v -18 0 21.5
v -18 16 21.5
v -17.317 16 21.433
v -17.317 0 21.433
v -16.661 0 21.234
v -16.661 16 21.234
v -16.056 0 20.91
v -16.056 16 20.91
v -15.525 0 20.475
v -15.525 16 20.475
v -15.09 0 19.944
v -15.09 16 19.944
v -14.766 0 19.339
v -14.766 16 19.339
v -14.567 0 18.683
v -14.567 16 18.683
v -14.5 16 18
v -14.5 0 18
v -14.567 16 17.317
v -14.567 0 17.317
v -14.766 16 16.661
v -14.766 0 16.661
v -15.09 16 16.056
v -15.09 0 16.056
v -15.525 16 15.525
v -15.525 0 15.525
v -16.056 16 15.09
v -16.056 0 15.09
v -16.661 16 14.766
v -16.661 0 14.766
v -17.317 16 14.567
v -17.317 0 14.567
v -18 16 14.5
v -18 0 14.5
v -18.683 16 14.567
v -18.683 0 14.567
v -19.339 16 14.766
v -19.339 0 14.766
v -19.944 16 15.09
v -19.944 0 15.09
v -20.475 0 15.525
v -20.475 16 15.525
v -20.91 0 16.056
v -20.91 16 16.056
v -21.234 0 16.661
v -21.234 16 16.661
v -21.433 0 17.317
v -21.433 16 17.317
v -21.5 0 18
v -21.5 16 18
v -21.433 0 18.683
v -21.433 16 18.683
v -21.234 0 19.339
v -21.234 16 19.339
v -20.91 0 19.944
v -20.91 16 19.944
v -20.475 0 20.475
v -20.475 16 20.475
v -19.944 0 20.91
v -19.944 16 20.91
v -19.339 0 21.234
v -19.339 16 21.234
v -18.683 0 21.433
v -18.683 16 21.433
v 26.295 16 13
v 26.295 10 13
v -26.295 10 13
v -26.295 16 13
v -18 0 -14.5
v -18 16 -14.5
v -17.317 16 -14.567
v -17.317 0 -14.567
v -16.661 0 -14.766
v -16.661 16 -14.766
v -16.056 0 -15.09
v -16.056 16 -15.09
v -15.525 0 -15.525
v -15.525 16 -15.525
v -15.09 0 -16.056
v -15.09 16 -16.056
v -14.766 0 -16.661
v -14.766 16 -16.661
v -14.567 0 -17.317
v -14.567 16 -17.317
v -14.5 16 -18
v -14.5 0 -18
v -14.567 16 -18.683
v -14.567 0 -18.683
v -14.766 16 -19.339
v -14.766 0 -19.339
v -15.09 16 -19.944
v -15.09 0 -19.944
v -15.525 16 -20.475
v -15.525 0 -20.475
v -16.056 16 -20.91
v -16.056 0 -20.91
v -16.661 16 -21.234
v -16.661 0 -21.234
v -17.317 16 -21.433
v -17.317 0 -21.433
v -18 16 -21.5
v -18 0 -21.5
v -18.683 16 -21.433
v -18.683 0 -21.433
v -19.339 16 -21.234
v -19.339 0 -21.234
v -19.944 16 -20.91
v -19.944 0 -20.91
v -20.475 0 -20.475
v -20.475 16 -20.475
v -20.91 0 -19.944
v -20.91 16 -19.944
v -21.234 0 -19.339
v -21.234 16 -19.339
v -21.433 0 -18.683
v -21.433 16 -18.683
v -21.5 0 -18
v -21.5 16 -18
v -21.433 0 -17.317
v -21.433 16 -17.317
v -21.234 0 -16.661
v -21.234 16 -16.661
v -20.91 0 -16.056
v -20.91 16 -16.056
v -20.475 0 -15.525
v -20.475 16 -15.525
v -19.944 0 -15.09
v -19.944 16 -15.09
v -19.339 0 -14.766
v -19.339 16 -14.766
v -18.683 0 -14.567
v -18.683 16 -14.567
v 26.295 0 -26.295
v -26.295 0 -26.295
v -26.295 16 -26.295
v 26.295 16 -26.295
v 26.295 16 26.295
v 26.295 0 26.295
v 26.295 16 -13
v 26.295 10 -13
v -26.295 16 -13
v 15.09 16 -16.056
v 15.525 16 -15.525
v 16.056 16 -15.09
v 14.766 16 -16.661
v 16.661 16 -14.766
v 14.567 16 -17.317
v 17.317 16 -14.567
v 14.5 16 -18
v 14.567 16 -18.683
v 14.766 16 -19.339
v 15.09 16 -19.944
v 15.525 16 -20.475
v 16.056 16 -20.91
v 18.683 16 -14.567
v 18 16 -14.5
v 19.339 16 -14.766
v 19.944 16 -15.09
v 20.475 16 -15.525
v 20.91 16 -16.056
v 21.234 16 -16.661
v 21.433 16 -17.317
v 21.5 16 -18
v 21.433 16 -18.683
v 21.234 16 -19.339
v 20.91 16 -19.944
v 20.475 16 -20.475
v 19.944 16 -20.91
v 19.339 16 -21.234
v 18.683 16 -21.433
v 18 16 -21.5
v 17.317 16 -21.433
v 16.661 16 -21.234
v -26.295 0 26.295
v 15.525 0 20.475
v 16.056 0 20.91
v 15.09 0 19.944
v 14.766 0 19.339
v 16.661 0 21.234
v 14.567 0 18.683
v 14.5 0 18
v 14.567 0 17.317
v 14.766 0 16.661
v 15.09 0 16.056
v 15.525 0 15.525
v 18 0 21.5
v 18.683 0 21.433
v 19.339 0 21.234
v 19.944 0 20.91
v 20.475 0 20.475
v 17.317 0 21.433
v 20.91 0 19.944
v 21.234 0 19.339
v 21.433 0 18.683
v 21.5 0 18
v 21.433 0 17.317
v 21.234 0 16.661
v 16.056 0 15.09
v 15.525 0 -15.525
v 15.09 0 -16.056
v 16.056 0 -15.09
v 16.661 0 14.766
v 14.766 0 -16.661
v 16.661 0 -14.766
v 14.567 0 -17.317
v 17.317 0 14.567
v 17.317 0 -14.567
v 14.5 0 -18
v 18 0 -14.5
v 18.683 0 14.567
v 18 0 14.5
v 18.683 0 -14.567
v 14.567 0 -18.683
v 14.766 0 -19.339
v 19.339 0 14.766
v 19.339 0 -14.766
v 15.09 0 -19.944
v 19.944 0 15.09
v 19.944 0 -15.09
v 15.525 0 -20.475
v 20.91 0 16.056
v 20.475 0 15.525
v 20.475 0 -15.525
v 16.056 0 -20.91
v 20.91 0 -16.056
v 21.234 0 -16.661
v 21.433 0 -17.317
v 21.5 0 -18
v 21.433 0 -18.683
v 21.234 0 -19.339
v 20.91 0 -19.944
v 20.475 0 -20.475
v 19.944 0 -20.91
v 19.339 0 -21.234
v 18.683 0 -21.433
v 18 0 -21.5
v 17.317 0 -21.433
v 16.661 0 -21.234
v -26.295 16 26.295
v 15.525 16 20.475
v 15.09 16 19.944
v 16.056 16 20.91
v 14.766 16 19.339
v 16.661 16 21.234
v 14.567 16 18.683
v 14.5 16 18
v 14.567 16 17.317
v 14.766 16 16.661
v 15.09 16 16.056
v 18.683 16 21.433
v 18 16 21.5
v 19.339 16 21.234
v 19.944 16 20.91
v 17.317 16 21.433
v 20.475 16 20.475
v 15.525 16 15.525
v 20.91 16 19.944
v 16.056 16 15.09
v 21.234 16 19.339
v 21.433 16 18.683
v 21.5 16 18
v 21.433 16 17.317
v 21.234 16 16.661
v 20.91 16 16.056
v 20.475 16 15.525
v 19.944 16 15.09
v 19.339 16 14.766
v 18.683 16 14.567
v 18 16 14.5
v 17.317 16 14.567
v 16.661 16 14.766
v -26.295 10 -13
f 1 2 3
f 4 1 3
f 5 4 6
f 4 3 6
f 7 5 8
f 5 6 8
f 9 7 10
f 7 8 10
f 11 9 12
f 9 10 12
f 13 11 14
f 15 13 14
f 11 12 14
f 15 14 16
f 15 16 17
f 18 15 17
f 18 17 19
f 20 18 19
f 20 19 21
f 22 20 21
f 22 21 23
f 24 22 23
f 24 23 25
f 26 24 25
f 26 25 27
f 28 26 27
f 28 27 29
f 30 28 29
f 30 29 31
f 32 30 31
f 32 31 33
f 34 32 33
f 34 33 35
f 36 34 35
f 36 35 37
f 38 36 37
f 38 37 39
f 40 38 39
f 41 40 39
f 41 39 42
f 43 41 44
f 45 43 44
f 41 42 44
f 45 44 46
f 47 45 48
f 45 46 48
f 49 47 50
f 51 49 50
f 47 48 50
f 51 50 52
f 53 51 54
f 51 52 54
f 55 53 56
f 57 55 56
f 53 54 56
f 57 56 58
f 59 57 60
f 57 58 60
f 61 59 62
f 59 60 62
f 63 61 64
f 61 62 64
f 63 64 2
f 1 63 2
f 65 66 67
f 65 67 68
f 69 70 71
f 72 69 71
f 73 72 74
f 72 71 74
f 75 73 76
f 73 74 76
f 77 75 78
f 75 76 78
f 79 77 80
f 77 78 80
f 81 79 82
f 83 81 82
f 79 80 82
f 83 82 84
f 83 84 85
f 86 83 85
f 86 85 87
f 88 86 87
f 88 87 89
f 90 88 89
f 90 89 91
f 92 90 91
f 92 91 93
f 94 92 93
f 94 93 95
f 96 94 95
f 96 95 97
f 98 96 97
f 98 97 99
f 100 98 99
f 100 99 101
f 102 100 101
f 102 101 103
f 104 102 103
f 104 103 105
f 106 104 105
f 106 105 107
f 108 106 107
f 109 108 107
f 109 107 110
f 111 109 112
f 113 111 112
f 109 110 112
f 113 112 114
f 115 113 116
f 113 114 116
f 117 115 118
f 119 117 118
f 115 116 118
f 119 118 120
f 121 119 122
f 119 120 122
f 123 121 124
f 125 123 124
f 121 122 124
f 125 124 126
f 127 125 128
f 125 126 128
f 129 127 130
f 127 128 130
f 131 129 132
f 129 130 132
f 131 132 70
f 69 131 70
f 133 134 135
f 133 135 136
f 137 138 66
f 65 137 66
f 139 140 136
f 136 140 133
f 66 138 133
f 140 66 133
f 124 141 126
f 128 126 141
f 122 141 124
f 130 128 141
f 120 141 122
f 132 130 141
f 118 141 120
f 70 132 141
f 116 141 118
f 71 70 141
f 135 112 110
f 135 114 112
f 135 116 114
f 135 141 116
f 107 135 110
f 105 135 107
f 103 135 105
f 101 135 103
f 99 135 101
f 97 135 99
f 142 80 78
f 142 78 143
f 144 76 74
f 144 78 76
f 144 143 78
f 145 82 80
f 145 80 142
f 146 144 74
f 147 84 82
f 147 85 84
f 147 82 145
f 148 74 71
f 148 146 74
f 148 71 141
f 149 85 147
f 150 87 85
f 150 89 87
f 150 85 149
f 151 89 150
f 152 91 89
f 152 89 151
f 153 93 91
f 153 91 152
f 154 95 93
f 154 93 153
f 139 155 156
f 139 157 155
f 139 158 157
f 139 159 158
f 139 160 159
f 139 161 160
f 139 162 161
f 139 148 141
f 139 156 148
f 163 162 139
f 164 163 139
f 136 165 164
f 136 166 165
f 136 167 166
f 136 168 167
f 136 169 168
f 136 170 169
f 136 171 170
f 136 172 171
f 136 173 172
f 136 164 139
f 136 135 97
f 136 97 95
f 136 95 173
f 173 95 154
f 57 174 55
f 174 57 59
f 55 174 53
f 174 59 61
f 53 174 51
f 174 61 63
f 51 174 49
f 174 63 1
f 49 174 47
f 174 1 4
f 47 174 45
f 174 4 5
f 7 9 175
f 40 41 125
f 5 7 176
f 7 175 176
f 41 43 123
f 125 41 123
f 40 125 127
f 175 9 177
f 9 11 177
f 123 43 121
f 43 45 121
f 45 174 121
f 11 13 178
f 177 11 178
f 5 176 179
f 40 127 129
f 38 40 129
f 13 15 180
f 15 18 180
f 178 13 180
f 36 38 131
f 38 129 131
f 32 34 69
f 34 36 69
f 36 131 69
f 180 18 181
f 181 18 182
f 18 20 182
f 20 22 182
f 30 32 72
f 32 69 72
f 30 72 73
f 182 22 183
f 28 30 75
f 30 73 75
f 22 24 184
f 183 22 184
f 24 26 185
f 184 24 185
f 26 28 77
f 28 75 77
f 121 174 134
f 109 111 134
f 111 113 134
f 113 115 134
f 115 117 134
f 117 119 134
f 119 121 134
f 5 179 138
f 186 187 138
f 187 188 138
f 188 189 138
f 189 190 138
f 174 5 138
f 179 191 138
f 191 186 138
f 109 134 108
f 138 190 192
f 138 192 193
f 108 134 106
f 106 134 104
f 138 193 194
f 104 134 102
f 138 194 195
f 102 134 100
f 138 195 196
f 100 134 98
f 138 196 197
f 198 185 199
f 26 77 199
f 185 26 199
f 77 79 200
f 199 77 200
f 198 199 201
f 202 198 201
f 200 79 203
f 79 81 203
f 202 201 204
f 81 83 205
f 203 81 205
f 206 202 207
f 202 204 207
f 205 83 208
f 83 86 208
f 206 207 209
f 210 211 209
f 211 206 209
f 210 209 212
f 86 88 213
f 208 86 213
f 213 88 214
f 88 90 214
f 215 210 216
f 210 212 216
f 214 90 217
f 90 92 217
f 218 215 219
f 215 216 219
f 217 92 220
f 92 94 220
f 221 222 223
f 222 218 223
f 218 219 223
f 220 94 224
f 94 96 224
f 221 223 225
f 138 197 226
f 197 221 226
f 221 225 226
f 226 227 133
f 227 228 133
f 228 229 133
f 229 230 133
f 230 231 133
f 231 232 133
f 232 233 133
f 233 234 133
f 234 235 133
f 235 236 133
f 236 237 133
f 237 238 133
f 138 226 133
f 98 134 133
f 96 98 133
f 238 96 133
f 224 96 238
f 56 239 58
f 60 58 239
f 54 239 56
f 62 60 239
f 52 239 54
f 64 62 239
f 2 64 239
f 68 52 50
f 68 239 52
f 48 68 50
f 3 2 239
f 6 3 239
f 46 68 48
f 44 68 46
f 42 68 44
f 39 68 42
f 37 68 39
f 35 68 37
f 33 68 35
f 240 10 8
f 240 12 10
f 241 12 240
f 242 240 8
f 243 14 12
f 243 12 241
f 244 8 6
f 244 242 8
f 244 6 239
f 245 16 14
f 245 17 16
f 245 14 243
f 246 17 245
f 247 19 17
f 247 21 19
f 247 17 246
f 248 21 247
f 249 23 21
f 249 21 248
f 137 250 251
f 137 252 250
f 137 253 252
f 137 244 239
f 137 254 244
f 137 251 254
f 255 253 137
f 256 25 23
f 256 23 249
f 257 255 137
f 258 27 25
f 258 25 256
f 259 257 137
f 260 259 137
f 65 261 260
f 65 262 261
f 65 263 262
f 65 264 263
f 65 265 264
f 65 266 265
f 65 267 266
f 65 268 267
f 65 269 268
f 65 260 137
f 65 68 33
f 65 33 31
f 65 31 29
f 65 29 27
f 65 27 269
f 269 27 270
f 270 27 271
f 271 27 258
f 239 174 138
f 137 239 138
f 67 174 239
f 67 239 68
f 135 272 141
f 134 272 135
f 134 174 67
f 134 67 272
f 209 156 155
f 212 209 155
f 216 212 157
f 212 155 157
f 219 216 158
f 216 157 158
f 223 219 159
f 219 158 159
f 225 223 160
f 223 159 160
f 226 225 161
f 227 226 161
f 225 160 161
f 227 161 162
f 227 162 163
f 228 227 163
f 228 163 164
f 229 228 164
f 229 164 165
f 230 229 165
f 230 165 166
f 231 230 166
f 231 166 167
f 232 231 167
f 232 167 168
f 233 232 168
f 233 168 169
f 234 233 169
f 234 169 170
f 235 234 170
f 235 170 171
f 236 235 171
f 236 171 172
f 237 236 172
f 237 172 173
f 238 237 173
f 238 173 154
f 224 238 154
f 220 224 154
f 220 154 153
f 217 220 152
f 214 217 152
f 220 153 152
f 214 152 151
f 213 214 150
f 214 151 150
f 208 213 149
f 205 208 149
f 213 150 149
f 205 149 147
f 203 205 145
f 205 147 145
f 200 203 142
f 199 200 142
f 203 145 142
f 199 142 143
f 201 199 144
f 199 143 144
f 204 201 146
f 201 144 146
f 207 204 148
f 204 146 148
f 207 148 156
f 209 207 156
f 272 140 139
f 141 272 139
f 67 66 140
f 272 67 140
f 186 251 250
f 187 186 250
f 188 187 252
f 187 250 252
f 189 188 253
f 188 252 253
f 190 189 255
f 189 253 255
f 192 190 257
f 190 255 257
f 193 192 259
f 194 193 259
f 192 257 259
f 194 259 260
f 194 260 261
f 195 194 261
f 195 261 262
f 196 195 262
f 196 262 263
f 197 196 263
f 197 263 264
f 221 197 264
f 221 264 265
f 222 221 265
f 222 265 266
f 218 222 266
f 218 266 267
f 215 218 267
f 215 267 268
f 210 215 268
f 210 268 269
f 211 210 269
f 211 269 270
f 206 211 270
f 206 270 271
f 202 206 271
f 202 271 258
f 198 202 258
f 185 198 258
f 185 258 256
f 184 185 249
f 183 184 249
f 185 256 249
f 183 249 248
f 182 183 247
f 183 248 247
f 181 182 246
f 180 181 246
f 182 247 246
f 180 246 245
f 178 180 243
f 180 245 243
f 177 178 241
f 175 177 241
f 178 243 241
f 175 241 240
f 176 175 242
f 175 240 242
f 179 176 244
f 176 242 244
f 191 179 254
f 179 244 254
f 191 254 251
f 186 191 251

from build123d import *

# Parameters (mm, degrees)
SKETCH1_W           = 52.59
SKETCH1_H           = 52.59
BOSS_EXTRUDE1_DEPTH = 16
SKETCH2_W           = 26
SKETCH2_H           = 6
CUT_EXTRUDE1_DEPTH  = 61.935499711
SKETCH3_R           = 3.5
CUT_EXTRUDE2_DEPTH  = 41.482762381


with BuildPart() as part:
    # Sketch1 → Boss-Extrude1 (new body)
    with BuildSketch(Plane(origin=(0, 0, 0), x_dir=(1, 0, 0), z_dir=(0, 1, 0))):
        Rectangle(SKETCH1_W, SKETCH1_H)
    extrude(amount=BOSS_EXTRUDE1_DEPTH)

    # Sketch2 → Cut-Extrude1 (cut, through all)
    with BuildSketch(Plane(origin=(26.295, 0, 0), x_dir=(0, 0, -1), z_dir=(1, 0, 0))):
        with Locations((0, 13)):
            Rectangle(SKETCH2_W, SKETCH2_H)
    extrude(amount=-CUT_EXTRUDE1_DEPTH, mode=Mode.SUBTRACT)

    # Sketch3 → Cut-Extrude2 (cut, through all)
    with BuildSketch(Plane(origin=(0, 16, 0), x_dir=(1, 0, 0), z_dir=(0, 1, 0))):
        with Locations(Location((-18, 18, 0), (0, 0, 270))):
            Circle(SKETCH3_R)
        with Locations(Location((18, 18, 0), (0, 0, 270))):
            Circle(SKETCH3_R)
        with Locations(Location((18, -18, 0), (0, 0, 270))):
            Circle(SKETCH3_R)
        with Locations(Location((-18, -18, 0), (0, 0, 270))):
            Circle(SKETCH3_R)
    extrude(amount=-CUT_EXTRUDE2_DEPTH, mode=Mode.SUBTRACT)


solid = part.part
